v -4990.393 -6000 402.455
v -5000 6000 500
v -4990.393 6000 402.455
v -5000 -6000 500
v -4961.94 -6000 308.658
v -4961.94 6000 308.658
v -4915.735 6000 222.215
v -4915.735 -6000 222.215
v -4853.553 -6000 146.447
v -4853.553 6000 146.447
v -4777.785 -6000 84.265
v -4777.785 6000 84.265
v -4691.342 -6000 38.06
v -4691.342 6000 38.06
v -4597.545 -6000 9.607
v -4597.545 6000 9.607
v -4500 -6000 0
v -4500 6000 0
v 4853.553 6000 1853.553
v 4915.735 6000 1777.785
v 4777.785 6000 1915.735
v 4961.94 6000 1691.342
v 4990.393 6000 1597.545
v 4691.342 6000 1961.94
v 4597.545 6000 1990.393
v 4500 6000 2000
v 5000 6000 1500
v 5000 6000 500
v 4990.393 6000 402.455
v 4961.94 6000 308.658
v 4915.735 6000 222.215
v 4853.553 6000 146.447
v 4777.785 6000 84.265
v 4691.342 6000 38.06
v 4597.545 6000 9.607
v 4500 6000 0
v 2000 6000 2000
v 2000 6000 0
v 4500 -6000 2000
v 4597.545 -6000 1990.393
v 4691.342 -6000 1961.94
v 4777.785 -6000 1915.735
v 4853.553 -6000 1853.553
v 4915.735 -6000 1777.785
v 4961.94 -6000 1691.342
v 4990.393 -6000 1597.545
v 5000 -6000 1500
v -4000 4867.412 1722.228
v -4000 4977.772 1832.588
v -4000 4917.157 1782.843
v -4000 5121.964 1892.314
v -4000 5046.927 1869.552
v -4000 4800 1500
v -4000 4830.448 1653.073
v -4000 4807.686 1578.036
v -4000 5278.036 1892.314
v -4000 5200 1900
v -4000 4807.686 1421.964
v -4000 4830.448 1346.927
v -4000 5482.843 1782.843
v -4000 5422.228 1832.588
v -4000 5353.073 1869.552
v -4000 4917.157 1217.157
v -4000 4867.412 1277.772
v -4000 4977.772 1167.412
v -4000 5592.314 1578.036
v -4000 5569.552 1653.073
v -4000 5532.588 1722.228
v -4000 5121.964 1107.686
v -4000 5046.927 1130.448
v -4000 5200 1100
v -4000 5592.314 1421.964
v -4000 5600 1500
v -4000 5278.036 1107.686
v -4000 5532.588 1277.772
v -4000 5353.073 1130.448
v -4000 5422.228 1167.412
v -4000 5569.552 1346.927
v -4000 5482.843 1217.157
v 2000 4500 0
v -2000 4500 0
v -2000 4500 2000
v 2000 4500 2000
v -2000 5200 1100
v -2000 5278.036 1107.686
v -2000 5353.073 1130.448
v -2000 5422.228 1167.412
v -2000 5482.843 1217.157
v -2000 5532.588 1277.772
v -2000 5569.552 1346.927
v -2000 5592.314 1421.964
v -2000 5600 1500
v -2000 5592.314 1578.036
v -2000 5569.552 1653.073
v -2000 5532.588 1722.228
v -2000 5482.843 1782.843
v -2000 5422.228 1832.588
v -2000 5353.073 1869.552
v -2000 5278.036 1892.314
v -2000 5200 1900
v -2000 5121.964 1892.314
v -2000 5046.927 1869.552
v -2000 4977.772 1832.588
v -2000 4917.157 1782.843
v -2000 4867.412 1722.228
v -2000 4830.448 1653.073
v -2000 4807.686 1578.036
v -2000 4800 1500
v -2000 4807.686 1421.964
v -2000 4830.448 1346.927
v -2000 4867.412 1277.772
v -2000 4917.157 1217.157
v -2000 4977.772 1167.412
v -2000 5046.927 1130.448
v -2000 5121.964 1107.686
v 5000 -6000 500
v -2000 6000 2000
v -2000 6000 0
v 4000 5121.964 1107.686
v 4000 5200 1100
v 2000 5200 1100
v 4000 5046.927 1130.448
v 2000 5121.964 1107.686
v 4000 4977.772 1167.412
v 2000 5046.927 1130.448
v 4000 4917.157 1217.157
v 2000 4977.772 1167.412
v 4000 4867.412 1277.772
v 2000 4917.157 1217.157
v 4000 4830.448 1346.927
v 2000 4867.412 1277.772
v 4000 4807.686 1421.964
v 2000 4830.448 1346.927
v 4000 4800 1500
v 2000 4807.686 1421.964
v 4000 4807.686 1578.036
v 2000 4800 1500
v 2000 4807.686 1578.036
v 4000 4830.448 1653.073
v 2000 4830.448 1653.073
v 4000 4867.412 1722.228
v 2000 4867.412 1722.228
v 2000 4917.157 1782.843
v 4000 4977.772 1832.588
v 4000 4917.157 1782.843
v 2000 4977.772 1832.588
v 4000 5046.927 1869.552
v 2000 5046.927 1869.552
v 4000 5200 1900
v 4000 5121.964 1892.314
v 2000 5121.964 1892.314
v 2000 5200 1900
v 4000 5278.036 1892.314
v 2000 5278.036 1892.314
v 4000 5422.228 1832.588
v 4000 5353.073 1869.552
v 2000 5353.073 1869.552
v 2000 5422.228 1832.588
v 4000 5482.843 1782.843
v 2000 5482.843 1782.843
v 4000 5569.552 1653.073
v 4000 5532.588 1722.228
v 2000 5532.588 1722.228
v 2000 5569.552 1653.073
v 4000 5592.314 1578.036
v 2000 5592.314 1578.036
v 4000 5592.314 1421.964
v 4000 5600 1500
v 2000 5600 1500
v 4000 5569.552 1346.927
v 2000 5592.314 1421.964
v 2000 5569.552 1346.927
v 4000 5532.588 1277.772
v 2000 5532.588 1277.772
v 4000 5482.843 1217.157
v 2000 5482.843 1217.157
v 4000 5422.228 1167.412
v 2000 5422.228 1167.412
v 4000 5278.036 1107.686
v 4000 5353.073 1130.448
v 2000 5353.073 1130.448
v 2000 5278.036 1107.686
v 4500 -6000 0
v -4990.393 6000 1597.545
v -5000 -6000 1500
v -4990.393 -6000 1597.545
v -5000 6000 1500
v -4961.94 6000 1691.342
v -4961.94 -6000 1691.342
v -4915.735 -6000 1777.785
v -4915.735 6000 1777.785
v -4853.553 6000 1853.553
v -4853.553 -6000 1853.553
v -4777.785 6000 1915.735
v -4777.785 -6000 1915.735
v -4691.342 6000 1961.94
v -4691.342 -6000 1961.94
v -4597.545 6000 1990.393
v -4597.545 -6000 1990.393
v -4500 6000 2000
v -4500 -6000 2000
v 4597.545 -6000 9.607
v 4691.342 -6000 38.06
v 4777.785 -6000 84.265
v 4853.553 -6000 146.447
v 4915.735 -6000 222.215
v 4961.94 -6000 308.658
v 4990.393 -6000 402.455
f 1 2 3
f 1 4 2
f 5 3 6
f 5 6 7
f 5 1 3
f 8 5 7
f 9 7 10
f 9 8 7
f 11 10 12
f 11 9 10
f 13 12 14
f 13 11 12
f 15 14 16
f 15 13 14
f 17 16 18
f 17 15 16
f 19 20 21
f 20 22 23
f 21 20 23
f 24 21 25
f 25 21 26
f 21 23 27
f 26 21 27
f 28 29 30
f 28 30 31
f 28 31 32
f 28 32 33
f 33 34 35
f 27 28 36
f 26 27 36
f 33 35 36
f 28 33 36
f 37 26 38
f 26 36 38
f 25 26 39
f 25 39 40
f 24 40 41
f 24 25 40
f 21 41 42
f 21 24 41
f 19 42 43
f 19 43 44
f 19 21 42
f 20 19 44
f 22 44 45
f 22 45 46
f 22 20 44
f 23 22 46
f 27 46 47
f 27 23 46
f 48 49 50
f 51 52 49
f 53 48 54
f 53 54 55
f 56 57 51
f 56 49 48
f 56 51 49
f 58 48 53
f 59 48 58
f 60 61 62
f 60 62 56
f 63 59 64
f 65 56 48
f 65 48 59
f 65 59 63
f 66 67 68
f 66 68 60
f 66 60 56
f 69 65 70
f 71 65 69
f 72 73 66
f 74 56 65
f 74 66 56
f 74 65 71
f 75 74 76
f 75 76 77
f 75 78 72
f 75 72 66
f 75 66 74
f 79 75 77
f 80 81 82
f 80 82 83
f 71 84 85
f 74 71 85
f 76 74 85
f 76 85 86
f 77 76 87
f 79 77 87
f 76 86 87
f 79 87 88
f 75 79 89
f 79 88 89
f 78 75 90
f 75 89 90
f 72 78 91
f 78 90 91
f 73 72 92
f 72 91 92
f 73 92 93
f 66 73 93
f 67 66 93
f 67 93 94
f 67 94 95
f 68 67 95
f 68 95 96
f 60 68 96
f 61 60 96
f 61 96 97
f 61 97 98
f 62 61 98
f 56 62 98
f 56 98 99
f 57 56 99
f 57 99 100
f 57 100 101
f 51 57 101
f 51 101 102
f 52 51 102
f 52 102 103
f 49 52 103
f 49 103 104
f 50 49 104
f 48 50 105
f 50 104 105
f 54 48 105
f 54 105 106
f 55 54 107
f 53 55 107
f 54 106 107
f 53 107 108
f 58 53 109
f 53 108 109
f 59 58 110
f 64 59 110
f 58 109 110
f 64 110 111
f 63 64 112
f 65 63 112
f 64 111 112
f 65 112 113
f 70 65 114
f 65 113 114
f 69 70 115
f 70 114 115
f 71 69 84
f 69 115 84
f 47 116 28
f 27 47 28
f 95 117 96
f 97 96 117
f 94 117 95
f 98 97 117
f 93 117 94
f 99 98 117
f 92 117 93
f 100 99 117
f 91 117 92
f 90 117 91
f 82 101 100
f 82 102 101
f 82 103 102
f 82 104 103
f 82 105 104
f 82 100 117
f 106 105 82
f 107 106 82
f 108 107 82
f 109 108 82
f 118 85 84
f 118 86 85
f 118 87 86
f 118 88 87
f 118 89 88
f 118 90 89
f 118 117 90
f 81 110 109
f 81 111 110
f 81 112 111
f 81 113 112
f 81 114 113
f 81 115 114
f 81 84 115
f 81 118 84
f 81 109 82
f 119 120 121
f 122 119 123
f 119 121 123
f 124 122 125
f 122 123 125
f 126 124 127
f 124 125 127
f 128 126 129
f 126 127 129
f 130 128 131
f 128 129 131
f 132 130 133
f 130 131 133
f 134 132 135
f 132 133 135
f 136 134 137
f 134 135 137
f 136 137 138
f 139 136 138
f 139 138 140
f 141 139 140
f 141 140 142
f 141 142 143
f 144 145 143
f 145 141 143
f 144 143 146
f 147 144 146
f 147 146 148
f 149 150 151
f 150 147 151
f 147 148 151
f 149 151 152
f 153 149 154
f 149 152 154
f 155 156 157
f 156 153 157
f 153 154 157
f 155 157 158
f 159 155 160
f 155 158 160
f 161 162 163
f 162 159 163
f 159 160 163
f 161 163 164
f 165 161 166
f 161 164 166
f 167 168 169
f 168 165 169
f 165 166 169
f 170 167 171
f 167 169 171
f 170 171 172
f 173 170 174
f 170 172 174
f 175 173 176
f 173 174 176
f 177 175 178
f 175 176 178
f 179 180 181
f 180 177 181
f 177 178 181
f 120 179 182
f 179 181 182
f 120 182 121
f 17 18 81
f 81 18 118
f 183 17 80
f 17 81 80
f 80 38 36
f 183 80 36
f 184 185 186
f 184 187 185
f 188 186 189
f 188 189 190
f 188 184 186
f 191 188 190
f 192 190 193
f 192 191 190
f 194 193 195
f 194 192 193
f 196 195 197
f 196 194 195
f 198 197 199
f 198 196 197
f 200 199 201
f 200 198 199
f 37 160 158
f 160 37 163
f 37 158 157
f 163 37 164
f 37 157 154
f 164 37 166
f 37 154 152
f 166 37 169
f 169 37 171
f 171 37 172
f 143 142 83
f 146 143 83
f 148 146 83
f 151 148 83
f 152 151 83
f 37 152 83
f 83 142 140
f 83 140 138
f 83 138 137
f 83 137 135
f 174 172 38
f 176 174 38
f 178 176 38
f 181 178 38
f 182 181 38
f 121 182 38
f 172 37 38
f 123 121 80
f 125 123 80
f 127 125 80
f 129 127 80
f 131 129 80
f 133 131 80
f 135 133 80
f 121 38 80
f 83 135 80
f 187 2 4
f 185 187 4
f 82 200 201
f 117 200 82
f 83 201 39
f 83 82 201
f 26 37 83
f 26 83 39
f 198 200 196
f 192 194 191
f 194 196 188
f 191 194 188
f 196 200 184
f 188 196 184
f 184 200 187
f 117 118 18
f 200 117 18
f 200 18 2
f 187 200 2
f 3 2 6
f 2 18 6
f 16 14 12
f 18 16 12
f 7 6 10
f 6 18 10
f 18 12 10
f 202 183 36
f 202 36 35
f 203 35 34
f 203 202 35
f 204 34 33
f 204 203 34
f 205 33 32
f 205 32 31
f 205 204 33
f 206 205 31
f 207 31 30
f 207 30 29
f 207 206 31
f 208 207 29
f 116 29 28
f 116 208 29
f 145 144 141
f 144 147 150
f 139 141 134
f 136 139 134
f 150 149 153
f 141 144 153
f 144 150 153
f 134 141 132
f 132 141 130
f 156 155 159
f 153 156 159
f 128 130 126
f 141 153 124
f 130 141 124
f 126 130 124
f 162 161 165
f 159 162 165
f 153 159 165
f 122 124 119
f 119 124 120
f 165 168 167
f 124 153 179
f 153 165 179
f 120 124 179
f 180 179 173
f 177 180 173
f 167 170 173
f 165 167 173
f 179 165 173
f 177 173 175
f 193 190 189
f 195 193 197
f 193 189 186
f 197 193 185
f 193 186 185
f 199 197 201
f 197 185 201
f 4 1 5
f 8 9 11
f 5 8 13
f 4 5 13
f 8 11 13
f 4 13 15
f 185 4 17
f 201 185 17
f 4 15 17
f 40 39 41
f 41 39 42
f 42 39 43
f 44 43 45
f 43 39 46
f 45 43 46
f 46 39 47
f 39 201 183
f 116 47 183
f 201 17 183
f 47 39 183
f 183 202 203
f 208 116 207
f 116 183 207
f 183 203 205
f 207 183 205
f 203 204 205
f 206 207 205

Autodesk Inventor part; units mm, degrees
ref_plane "YZ Plane" through (0, 0, 0) normal (1, 0, 0) x (0, 1, 0)
ref_plane "XZ Plane" through (0, 0, 0) normal (0, 1, 0) x (-1, 0, 0)
ref_plane "XY Plane" through (0, 0, 0) normal (0, 0, 1) x (1, 0, 0)
sketch "Skizze1" plane through (0, 0, 0) normal (0, 0, 1) x (1, 0, 0)
  line L0 (-7000, 0) -> (7000, 0) construction
  line L1 (0, -8400) -> (0, 8400) construction
  line L2 (-5000, -6000) -> (5000, -6000)
  line L3 (5000, -6000) -> (5000, 6000)
  line L4 (5000, 6000) -> (-5000, 6000)
  line L5 (-5000, 6000) -> (-5000, -6000)
  line L6 (-5000, -6000) -> (5000, 6000) construction
  line L7 (5000, -6000) -> (-5000, 6000) construction
  line L8 (5000, 6000) -> (2000, 6000)
  line L9 (5000, 4500) -> (5000, 6000)
  line L10 (-5000, 6000) -> (-5000, 6000)
  line L11 (-5000, 6000) -> (-5000, 4500)
  line L12 (5000, 6000) -> (2000, 6000)
  line L13 (2000, 6000) -> (2000, 4500)
  line L14 (5000, 4500) -> (5000, 6000)
  line L15 (-5000, 6000) -> (-2000, 6000)
  line L16 (-2000, 6000) -> (-2000, 4500)
  line L17 (-5000, 4500) -> (-5000, 6000)
  line L18 (-2000, 4500) -> (2000, 4500)
  point P0 (0, 0)
  dimension "d5" = 12000
  dimension "d6" = 3000
  dimension "d7" = 3000
extrude "Extrusion1" add sketch "Skizze1" along normal blind 2000 contours L5 L4 L16 L18 L13 L3 L2
sketch "Skizze2" plane through (-2000, 4500, 0) normal (1, 0, 0) x (0, 0, -1)
  circle A0 centre (-1500, 700) radius 400
  line L0 (0, -10500) -> (0, 1500) construction
  line L1 (0, 0) -> (-2000, 0) construction
  point P0 (0, -4500)
  point P1 (-1000, 0)
extrude "Extrusion2" cut sketch "Skizze2" against normal blind 2000
extrude "Extrusion3" cut sketch "Skizze2" along normal blind 6000
sketch "Skizze3" plane through (-5000, -6000, 0) normal (-1, 0, 0) x (0, 0, 1)
  point P0 (0, 6000)
fillet "Rundung1" radius 500 4 edges at (-5000, 0, 0) (-5000, 0, 2000) (5000, 0, 0) (5000, 0, 2000)
